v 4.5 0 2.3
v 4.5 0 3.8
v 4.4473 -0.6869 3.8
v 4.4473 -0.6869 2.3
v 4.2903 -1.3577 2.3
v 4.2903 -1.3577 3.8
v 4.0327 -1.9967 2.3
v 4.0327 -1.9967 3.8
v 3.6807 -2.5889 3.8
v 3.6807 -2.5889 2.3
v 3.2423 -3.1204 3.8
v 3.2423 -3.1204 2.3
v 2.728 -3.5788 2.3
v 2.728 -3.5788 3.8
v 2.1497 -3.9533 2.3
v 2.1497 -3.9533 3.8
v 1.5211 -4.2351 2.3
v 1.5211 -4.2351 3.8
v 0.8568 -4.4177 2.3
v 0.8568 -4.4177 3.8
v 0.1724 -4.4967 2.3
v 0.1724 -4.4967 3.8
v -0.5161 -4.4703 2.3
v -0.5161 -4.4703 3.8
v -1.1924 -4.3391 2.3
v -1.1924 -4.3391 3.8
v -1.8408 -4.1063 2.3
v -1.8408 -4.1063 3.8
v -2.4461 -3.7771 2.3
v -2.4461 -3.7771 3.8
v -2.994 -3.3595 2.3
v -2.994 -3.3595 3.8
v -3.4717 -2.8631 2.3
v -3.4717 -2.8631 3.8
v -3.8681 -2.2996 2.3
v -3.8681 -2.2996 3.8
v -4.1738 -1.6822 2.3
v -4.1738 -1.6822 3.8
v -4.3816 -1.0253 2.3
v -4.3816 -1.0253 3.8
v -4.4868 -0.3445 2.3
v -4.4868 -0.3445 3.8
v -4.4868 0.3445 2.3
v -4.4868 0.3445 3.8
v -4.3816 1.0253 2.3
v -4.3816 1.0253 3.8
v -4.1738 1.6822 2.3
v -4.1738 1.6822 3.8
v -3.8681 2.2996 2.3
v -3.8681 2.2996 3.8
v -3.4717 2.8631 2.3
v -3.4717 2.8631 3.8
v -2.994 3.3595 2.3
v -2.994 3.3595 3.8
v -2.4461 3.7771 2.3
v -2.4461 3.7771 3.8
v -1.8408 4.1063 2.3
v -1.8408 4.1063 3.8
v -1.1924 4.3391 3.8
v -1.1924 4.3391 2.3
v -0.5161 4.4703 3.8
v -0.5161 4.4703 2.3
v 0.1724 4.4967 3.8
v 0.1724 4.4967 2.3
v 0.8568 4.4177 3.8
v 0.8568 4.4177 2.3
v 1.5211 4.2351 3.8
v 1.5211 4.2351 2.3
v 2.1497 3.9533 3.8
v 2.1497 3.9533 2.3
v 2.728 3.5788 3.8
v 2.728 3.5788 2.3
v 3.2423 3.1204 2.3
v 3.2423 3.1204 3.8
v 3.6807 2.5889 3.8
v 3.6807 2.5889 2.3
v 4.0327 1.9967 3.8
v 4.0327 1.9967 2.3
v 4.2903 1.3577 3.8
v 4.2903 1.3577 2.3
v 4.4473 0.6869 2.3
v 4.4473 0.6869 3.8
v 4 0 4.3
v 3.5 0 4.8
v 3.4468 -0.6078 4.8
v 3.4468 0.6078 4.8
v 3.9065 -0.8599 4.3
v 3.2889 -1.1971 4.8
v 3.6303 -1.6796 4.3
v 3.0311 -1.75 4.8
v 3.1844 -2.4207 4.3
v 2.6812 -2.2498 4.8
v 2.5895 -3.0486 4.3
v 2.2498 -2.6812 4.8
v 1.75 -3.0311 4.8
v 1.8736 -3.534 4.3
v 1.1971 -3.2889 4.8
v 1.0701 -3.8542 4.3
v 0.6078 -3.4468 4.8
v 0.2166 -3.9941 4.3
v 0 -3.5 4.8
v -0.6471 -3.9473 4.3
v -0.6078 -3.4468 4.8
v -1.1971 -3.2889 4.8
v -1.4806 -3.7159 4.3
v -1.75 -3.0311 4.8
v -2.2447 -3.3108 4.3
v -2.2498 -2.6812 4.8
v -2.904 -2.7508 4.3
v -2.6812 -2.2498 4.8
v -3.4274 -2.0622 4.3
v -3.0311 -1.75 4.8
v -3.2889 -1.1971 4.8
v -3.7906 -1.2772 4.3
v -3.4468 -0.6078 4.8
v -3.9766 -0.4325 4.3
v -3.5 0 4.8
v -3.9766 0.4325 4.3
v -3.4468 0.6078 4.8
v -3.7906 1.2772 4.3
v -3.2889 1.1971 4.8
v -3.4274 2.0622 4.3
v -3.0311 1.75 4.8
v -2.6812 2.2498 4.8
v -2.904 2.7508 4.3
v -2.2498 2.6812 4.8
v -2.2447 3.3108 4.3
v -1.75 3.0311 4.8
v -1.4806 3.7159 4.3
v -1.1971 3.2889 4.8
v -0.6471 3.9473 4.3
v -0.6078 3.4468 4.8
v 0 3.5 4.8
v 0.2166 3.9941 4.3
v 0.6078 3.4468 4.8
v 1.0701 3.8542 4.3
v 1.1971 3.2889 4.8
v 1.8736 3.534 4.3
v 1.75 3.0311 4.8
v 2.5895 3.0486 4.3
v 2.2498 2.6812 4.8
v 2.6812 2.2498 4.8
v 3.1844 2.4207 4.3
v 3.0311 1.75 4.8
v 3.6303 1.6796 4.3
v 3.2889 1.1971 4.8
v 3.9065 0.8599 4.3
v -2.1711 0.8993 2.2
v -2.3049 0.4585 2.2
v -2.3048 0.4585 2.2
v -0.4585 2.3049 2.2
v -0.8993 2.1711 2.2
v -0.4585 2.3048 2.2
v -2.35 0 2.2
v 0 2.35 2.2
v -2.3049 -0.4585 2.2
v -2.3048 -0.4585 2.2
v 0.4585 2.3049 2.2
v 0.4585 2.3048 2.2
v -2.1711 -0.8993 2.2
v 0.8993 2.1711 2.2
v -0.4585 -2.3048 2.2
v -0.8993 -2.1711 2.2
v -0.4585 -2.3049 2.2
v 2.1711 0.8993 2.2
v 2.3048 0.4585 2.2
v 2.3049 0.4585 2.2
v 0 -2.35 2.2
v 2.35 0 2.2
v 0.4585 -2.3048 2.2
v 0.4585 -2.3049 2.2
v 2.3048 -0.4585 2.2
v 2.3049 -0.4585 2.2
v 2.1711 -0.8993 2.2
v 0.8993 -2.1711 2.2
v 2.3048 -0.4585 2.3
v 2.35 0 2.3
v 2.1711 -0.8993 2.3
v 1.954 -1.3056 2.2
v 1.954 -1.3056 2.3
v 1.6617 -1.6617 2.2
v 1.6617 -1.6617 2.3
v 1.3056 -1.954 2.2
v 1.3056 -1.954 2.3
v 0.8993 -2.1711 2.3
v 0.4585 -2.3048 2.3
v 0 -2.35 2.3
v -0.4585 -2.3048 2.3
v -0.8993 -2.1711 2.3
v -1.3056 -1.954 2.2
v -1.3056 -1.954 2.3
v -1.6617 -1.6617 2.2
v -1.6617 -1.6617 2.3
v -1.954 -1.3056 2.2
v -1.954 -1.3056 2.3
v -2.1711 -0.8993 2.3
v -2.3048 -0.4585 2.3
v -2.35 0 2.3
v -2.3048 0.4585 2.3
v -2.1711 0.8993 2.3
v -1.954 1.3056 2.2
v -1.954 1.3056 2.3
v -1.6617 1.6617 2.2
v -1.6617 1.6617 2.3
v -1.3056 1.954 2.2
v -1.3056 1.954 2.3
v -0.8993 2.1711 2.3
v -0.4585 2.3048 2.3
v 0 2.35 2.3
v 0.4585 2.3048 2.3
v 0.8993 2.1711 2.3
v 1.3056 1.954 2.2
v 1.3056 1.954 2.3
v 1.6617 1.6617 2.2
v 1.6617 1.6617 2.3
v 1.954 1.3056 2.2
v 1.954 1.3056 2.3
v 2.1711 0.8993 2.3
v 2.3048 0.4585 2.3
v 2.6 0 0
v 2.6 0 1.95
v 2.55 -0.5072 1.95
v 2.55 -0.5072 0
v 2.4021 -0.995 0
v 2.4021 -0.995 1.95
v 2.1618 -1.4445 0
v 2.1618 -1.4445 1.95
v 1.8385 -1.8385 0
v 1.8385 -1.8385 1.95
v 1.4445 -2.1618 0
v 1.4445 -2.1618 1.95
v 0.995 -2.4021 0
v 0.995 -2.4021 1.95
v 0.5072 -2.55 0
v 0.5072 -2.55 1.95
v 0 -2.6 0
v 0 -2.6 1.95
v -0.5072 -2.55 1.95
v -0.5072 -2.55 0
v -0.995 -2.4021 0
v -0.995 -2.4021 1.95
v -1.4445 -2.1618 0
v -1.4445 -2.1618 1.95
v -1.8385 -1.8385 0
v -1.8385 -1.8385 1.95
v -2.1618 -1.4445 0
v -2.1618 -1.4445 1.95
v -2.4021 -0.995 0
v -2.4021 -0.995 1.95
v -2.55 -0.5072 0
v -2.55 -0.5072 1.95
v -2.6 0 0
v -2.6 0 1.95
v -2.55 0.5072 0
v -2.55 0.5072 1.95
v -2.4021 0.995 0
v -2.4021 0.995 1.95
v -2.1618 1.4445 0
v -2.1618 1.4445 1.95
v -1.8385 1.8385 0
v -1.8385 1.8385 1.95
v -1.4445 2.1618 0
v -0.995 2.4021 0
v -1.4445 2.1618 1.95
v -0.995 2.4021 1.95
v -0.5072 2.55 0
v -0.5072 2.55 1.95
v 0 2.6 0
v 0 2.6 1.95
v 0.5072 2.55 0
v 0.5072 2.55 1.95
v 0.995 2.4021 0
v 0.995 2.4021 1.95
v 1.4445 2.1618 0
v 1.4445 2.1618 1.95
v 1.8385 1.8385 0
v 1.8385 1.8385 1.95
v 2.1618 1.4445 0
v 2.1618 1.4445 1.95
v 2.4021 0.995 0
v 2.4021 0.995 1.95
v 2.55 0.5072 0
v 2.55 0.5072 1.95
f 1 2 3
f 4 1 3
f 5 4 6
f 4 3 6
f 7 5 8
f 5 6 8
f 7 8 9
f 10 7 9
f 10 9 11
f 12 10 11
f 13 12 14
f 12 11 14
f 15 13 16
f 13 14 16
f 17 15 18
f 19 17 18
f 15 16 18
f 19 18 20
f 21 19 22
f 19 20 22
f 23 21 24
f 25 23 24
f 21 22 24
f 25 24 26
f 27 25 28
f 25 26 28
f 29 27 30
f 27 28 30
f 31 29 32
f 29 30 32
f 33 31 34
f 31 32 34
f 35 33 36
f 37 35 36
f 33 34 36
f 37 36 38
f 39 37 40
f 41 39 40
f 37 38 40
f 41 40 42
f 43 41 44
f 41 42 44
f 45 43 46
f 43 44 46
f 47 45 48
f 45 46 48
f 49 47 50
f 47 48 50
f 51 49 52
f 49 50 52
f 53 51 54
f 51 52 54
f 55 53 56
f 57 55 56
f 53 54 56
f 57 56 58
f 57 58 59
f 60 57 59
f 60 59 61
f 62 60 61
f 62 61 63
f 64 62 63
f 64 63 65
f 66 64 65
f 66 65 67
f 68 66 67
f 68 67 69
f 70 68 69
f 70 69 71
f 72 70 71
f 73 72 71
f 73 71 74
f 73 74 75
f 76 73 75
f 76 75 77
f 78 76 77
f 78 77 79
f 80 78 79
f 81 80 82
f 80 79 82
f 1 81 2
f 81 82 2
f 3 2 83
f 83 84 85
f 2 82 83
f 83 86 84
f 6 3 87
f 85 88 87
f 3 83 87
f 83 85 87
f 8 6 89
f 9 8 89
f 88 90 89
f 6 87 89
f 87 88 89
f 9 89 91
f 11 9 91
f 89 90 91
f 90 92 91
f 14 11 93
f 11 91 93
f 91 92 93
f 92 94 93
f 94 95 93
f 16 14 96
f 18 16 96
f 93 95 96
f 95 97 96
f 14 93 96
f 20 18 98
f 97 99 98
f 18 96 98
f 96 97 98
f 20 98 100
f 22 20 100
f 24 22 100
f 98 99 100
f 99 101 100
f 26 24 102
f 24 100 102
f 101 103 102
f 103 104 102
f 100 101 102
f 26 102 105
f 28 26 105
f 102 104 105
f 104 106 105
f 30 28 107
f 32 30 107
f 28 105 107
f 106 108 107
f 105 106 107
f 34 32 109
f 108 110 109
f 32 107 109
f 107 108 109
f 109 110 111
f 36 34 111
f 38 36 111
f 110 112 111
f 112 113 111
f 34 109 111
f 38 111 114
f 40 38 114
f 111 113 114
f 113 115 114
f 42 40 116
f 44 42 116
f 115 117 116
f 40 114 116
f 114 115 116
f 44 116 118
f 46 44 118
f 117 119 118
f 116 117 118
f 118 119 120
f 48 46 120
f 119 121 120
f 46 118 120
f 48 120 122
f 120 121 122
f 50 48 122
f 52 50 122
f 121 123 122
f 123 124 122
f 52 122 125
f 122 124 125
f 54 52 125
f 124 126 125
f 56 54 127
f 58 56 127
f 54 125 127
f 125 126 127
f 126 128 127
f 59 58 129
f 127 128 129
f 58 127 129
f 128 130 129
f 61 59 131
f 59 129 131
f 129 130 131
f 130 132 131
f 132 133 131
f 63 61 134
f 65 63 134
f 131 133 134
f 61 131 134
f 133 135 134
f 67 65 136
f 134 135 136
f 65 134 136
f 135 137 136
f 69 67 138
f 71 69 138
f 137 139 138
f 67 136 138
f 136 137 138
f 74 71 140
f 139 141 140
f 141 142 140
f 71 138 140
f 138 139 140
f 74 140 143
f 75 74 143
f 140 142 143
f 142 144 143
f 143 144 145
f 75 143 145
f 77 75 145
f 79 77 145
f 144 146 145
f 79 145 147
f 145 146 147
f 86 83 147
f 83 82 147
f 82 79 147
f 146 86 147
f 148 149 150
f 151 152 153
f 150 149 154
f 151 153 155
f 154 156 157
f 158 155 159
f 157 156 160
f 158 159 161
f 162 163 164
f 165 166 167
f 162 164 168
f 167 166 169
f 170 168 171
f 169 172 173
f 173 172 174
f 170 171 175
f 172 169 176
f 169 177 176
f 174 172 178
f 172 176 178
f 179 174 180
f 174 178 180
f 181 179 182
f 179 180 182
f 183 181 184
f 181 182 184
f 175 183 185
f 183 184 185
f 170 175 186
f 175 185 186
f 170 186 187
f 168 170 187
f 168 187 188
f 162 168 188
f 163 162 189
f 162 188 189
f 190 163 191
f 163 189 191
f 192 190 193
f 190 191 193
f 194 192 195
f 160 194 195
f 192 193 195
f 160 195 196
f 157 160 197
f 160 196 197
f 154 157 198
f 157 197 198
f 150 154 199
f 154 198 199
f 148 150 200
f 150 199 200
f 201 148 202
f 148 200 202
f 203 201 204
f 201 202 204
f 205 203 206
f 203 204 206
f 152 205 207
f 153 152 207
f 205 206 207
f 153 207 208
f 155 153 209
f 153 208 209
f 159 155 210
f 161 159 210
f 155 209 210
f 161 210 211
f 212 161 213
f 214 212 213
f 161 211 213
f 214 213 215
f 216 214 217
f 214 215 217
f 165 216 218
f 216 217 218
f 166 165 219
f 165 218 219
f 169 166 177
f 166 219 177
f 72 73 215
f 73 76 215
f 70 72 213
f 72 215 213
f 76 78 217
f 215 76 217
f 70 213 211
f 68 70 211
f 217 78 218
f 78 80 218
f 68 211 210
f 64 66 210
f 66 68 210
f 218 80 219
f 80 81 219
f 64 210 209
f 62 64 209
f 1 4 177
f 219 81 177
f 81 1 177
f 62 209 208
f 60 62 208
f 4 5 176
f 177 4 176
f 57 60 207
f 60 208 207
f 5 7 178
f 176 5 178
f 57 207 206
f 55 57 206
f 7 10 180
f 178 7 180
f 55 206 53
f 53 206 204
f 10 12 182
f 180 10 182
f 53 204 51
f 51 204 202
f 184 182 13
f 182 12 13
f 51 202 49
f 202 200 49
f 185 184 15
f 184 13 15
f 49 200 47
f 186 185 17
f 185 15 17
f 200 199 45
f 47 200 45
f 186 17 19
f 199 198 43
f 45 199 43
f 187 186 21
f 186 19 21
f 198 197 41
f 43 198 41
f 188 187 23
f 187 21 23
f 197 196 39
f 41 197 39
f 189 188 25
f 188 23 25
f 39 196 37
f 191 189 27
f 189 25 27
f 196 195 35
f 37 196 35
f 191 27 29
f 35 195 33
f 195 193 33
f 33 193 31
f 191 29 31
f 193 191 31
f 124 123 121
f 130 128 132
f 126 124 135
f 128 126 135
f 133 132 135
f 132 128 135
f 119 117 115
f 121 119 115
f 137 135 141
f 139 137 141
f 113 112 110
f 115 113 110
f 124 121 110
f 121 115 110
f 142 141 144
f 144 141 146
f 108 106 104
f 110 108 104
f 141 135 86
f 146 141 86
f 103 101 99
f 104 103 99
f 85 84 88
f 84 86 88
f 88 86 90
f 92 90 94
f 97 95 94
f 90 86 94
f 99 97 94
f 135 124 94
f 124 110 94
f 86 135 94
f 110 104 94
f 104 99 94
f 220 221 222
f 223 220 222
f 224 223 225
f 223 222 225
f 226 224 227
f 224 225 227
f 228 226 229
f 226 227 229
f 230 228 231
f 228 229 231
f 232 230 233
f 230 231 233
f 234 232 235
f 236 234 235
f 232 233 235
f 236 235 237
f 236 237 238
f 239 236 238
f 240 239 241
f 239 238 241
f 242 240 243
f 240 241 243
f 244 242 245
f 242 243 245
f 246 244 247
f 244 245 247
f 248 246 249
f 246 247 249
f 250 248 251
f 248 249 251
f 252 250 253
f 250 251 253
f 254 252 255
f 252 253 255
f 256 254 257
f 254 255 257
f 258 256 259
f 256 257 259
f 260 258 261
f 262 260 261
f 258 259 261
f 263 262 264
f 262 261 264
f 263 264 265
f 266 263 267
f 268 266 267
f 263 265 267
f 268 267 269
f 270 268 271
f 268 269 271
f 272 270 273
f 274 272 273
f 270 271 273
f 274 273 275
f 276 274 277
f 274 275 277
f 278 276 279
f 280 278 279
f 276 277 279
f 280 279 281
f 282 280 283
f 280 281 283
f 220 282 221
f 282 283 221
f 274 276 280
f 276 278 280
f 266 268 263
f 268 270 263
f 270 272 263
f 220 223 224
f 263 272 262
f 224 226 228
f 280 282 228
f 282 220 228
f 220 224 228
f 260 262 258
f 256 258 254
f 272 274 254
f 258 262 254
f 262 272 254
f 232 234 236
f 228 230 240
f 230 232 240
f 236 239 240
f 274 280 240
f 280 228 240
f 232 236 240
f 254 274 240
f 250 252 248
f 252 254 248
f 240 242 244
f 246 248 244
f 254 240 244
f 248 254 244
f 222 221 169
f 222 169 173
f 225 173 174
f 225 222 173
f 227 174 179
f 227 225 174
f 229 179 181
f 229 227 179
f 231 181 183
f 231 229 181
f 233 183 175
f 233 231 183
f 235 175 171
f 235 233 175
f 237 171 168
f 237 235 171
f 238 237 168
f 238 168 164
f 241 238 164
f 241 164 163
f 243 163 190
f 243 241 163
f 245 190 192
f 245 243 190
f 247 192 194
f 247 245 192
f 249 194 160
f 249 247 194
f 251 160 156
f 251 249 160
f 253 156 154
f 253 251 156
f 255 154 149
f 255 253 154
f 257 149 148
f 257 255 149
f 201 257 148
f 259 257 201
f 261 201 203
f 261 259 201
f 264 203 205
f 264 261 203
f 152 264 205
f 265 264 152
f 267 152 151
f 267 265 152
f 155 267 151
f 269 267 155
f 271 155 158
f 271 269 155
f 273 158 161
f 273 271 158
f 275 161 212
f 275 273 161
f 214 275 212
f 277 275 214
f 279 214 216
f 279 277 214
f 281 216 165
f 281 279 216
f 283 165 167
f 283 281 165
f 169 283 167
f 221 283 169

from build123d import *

# Parameters (mm, degrees)
F2_SIZE = 1
F3_SIZE = 0.24999


# Not quite as in the source:
# - a fillet or chamfer is up to 0.001 mm smaller than in the source, because OpenCascade refuses the exact size


with BuildPart() as f1:
    # F0 (on Front) → F1 (revolve)
    with BuildSketch(Plane.XZ):
        Polygon((0, 4.8), (0, 0), (2.6, 0), (2.6, 2.2), (2.35, 2.2), (2.35, 2.3), (2.6, 2.3), (4.5, 2.3), (4.5, 4.8), align=None)
    revolve(axis=Axis((0, 0, 2.4), (0, 0, -1)))

    # F2
    f2_edges = [f1.edges().sort_by_distance(p)[0] for p in [
        (-4.5, 0, 4.8),
    ]]
    chamfer(f2_edges, length=F2_SIZE)

    # F3 (size 0.25 in the source; OpenCascade refuses exactly that, so slightly less here)
    f3_edges = [f1.edges().sort_by_distance(p)[0] for p in [
        (-2.6, 0, 2.2),
    ]]
    chamfer(f3_edges, length=F3_SIZE)


solid = f1.part
